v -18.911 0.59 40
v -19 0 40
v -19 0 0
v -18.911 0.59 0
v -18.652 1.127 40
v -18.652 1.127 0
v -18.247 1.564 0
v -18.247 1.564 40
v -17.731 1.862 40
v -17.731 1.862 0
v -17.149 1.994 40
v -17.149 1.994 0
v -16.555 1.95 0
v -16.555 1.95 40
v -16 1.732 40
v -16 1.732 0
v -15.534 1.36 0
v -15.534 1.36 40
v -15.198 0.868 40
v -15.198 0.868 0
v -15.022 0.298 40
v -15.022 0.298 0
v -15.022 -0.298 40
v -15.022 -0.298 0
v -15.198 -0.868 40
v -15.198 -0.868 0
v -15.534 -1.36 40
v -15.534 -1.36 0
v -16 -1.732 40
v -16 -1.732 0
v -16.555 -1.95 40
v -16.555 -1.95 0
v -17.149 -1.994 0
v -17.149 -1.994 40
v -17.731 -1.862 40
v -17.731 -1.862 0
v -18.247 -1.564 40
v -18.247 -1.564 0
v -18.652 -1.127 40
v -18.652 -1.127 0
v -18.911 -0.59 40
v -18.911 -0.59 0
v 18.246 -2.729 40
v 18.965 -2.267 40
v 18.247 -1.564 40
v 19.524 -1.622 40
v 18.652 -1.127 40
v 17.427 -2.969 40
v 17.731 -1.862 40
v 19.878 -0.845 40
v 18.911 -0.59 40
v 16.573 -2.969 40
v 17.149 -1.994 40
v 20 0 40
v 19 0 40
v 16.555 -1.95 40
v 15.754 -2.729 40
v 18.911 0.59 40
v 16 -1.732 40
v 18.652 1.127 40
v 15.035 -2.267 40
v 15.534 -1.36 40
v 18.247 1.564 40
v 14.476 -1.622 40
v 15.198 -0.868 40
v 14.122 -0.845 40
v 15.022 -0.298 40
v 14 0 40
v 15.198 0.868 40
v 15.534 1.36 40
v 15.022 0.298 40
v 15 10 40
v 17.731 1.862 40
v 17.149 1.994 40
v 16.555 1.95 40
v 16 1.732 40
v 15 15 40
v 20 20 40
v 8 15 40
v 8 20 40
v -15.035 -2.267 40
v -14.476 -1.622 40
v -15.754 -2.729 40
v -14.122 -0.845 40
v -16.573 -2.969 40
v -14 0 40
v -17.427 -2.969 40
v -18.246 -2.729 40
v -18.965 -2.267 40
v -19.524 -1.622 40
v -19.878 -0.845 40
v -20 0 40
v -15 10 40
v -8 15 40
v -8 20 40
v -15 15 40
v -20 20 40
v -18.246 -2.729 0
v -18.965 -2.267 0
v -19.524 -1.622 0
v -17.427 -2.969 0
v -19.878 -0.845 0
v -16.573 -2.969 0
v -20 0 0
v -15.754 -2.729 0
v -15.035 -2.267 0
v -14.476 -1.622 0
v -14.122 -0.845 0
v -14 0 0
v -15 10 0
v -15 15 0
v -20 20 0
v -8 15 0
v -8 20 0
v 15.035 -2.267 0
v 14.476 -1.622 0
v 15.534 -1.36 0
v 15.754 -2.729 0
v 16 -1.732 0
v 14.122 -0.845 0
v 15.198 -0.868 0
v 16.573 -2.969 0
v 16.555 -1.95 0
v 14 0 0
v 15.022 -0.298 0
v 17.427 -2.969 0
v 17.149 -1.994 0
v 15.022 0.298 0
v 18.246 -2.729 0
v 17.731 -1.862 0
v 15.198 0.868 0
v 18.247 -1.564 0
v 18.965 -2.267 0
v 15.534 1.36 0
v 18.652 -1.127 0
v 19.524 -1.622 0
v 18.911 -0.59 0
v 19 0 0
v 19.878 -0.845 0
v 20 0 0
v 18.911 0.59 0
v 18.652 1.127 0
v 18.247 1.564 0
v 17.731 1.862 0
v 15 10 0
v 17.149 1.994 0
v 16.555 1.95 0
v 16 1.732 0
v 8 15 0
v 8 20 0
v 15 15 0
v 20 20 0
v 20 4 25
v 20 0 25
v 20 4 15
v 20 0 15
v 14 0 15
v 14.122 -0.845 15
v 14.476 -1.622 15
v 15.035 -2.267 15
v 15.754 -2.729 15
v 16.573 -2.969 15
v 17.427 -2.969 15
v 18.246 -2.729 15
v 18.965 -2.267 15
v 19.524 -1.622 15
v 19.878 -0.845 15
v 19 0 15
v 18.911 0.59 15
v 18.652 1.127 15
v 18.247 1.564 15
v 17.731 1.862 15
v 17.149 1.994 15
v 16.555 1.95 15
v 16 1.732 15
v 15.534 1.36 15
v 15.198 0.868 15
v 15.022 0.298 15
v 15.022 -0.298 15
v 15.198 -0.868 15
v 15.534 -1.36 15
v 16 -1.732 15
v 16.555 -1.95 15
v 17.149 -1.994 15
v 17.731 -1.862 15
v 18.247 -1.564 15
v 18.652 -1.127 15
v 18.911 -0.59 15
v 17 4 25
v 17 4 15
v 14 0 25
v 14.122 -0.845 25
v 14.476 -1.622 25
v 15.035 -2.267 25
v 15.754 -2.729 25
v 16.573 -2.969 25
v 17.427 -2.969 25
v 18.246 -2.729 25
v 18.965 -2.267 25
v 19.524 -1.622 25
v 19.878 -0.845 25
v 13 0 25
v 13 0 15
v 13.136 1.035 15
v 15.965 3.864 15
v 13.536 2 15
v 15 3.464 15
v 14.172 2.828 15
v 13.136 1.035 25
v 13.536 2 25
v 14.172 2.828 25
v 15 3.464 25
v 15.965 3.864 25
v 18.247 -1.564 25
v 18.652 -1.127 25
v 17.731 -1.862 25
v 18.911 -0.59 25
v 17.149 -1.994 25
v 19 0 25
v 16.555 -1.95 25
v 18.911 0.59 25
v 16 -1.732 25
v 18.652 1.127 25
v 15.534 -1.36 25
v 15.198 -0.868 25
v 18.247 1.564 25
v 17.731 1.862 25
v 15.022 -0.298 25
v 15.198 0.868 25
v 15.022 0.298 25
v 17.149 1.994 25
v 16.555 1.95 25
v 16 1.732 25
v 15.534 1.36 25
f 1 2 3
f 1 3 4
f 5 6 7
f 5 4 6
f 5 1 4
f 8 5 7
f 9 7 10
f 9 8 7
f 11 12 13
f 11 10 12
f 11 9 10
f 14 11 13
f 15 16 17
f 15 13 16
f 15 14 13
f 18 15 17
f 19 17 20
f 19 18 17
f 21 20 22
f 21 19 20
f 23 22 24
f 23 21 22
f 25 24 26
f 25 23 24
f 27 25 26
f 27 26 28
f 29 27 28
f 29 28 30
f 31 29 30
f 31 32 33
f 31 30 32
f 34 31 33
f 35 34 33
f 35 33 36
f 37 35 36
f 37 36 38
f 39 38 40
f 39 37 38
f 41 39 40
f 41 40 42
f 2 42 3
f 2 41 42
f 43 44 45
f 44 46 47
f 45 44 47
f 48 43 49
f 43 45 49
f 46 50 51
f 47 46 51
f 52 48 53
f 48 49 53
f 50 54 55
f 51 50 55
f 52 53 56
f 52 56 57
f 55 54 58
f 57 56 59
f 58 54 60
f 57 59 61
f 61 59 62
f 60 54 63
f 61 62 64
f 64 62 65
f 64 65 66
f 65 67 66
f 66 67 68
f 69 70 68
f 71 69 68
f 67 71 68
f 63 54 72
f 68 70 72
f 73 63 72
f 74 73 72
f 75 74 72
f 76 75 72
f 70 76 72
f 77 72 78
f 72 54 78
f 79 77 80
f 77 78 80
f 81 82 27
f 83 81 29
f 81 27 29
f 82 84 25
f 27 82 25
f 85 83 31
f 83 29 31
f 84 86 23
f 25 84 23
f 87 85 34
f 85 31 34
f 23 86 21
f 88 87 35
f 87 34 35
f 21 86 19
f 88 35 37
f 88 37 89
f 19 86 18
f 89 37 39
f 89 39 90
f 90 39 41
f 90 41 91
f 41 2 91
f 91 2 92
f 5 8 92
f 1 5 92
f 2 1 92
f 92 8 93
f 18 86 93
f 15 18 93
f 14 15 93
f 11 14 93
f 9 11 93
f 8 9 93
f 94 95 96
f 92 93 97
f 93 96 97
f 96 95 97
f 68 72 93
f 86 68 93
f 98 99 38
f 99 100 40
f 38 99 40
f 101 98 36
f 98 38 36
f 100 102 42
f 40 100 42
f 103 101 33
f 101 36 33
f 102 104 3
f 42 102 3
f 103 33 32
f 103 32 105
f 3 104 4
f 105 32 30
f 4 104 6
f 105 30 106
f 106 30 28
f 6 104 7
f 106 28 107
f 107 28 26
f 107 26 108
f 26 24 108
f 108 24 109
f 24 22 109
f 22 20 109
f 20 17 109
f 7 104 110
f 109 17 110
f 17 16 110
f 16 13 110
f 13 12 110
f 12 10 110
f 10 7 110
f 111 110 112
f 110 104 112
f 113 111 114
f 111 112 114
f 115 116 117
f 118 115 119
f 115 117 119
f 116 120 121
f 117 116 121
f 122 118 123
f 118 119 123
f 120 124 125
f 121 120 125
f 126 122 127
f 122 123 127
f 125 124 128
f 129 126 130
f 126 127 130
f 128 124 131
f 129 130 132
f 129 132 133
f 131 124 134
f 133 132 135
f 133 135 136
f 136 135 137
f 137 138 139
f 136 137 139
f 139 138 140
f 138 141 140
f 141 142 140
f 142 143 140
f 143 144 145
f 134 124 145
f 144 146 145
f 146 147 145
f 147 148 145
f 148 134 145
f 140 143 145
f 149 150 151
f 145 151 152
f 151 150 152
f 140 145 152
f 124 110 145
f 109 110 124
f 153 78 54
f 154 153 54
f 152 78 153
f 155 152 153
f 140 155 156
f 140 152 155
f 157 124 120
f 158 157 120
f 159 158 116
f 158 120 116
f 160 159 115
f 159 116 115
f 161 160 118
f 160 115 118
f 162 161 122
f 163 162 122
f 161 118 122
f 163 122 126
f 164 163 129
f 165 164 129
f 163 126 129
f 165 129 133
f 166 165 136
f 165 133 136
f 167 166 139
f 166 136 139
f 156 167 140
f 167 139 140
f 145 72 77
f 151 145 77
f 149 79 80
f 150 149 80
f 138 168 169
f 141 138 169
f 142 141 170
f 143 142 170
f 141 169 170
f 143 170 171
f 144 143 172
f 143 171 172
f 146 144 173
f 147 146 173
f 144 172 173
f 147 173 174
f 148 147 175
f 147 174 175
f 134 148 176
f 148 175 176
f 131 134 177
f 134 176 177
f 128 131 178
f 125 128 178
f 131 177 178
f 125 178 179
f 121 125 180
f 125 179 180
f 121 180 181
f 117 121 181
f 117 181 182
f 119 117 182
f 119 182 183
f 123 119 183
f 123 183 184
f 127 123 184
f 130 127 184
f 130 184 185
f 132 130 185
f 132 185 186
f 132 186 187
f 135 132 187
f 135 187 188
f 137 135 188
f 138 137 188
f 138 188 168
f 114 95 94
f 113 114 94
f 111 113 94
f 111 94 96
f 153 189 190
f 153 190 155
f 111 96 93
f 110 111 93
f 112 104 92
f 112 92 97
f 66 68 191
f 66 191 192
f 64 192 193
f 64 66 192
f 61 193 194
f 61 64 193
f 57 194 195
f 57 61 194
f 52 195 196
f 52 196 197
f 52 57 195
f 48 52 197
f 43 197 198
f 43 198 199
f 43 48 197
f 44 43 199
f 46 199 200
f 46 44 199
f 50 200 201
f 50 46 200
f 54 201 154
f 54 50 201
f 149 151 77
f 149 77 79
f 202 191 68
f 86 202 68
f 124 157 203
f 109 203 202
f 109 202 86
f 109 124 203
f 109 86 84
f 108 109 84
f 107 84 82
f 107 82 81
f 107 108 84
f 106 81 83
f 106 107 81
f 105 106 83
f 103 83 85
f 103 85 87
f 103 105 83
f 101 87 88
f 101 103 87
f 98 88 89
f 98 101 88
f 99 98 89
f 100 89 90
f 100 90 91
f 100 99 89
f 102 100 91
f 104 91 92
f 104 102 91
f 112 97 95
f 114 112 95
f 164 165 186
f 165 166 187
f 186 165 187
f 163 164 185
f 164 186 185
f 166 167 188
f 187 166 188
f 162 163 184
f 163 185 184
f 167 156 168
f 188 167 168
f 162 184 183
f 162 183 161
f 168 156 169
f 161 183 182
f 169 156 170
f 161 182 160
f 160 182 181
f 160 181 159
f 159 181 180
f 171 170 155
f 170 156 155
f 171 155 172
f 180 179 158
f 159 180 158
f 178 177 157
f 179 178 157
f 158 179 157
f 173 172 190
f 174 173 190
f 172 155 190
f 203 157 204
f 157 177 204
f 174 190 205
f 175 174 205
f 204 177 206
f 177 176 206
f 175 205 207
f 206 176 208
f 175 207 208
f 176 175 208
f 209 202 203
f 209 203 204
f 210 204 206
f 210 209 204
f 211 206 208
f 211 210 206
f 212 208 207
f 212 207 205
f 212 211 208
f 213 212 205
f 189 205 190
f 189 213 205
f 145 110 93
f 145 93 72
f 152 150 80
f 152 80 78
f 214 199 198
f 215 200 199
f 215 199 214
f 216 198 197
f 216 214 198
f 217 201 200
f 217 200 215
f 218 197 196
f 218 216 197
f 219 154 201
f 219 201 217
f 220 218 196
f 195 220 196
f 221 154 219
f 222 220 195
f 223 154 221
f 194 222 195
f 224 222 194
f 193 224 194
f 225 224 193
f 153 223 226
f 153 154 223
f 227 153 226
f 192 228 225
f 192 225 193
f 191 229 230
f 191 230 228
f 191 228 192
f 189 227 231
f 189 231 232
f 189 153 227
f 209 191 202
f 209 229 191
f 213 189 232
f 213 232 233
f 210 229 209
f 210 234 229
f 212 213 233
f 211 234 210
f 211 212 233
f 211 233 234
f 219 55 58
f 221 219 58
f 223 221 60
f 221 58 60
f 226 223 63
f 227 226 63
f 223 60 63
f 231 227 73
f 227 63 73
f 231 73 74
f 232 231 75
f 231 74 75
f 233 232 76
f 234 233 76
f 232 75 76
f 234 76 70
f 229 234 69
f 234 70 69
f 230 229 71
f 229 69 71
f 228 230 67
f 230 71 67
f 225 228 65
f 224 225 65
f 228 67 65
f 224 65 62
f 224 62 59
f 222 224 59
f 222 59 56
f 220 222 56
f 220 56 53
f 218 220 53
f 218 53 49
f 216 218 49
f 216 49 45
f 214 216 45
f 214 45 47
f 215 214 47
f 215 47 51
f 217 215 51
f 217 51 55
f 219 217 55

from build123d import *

# Parameters (mm, degrees)
BOSS_EXTRUDE1_DEPTH     = 40
BOSS_EXTRUDE2_DEPTH     = 15
SKETCH9_R               = 3
BOSS_EXTRUDE3_DEPTH     = 40
CUT_EXTRUDE2_DEPTH      = 10
F_4_0_MM_DOWEL_HOLES2_D = 4


with BuildPart() as part:
    # Sketch2 → Boss-Extrude1 (new body)
    with BuildSketch(Plane.XY):
        Polygon((-20, 20), (-8, 20), (-8, 15), (-15, 15), (-15, 10), (15, 10), (15, 15), (8, 15), (8, 20), (20, 20), (20, 0), (-20, 0), align=None)
    extrude(amount=BOSS_EXTRUDE1_DEPTH)

    # Sketch3 → Boss-Extrude2 (add)
    with BuildSketch(Plane(origin=(0, 0, 0), x_dir=(-1, 0, 0), z_dir=(0, 0, -1))):
        with BuildLine():
            Line((-20, 0), (-14, 0))
            ThreePointArc((-14, 0), (-17, -3), (-20, 0))
        make_face()
    boss_extrude2 = extrude(amount=-BOSS_EXTRUDE2_DEPTH)

    # Mirror1: Boss-Extrude2 across plane
    add(boss_extrude2.mirror(Plane(origin=(0, 0, 20), x_dir=(1, 0, 0), z_dir=(0, 0, -1))))

    # Sketch9 → Boss-Extrude3 (add)
    with BuildSketch(Plane(origin=(0, 0, 0), x_dir=(-1, 0, 0), z_dir=(0, 0, -1))):
        with Locations((17, 0)):
            Circle(SKETCH9_R)
    extrude(amount=-BOSS_EXTRUDE3_DEPTH)

    # Sketch10 → Cut-Extrude2 (cut)
    with BuildSketch(Plane(origin=(0, 0, 25), x_dir=(-1, 0, 0), z_dir=(0, 0, -1))):
        with BuildLine():
            Line((-17, 4), (-20, 4))
            Line((-20, 4), (-20, 2.645751311))
            ThreePointArc((-20, 2.645751311), (-15.354248689, -3.645751311), (-17, 4))
        make_face()
    extrude(amount=CUT_EXTRUDE2_DEPTH, mode=Mode.SUBTRACT)

    # Ø4.0 mm Dowel Holes2 (through all)
    with Locations(Plane(origin=(0, 0, 0), x_dir=(-1, 0, 0), z_dir=(0, 0, -1))):
        with Locations((-17, 0)):
            f_4_0_mm_dowel_holes2 = Hole(F_4_0_MM_DOWEL_HOLES2_D / 2)

    # Mirror5: Ø4.0 mm Dowel Holes2 across plane
    add(f_4_0_mm_dowel_holes2.mirror(Plane.ZY), mode=Mode.SUBTRACT)


solid = part.part
